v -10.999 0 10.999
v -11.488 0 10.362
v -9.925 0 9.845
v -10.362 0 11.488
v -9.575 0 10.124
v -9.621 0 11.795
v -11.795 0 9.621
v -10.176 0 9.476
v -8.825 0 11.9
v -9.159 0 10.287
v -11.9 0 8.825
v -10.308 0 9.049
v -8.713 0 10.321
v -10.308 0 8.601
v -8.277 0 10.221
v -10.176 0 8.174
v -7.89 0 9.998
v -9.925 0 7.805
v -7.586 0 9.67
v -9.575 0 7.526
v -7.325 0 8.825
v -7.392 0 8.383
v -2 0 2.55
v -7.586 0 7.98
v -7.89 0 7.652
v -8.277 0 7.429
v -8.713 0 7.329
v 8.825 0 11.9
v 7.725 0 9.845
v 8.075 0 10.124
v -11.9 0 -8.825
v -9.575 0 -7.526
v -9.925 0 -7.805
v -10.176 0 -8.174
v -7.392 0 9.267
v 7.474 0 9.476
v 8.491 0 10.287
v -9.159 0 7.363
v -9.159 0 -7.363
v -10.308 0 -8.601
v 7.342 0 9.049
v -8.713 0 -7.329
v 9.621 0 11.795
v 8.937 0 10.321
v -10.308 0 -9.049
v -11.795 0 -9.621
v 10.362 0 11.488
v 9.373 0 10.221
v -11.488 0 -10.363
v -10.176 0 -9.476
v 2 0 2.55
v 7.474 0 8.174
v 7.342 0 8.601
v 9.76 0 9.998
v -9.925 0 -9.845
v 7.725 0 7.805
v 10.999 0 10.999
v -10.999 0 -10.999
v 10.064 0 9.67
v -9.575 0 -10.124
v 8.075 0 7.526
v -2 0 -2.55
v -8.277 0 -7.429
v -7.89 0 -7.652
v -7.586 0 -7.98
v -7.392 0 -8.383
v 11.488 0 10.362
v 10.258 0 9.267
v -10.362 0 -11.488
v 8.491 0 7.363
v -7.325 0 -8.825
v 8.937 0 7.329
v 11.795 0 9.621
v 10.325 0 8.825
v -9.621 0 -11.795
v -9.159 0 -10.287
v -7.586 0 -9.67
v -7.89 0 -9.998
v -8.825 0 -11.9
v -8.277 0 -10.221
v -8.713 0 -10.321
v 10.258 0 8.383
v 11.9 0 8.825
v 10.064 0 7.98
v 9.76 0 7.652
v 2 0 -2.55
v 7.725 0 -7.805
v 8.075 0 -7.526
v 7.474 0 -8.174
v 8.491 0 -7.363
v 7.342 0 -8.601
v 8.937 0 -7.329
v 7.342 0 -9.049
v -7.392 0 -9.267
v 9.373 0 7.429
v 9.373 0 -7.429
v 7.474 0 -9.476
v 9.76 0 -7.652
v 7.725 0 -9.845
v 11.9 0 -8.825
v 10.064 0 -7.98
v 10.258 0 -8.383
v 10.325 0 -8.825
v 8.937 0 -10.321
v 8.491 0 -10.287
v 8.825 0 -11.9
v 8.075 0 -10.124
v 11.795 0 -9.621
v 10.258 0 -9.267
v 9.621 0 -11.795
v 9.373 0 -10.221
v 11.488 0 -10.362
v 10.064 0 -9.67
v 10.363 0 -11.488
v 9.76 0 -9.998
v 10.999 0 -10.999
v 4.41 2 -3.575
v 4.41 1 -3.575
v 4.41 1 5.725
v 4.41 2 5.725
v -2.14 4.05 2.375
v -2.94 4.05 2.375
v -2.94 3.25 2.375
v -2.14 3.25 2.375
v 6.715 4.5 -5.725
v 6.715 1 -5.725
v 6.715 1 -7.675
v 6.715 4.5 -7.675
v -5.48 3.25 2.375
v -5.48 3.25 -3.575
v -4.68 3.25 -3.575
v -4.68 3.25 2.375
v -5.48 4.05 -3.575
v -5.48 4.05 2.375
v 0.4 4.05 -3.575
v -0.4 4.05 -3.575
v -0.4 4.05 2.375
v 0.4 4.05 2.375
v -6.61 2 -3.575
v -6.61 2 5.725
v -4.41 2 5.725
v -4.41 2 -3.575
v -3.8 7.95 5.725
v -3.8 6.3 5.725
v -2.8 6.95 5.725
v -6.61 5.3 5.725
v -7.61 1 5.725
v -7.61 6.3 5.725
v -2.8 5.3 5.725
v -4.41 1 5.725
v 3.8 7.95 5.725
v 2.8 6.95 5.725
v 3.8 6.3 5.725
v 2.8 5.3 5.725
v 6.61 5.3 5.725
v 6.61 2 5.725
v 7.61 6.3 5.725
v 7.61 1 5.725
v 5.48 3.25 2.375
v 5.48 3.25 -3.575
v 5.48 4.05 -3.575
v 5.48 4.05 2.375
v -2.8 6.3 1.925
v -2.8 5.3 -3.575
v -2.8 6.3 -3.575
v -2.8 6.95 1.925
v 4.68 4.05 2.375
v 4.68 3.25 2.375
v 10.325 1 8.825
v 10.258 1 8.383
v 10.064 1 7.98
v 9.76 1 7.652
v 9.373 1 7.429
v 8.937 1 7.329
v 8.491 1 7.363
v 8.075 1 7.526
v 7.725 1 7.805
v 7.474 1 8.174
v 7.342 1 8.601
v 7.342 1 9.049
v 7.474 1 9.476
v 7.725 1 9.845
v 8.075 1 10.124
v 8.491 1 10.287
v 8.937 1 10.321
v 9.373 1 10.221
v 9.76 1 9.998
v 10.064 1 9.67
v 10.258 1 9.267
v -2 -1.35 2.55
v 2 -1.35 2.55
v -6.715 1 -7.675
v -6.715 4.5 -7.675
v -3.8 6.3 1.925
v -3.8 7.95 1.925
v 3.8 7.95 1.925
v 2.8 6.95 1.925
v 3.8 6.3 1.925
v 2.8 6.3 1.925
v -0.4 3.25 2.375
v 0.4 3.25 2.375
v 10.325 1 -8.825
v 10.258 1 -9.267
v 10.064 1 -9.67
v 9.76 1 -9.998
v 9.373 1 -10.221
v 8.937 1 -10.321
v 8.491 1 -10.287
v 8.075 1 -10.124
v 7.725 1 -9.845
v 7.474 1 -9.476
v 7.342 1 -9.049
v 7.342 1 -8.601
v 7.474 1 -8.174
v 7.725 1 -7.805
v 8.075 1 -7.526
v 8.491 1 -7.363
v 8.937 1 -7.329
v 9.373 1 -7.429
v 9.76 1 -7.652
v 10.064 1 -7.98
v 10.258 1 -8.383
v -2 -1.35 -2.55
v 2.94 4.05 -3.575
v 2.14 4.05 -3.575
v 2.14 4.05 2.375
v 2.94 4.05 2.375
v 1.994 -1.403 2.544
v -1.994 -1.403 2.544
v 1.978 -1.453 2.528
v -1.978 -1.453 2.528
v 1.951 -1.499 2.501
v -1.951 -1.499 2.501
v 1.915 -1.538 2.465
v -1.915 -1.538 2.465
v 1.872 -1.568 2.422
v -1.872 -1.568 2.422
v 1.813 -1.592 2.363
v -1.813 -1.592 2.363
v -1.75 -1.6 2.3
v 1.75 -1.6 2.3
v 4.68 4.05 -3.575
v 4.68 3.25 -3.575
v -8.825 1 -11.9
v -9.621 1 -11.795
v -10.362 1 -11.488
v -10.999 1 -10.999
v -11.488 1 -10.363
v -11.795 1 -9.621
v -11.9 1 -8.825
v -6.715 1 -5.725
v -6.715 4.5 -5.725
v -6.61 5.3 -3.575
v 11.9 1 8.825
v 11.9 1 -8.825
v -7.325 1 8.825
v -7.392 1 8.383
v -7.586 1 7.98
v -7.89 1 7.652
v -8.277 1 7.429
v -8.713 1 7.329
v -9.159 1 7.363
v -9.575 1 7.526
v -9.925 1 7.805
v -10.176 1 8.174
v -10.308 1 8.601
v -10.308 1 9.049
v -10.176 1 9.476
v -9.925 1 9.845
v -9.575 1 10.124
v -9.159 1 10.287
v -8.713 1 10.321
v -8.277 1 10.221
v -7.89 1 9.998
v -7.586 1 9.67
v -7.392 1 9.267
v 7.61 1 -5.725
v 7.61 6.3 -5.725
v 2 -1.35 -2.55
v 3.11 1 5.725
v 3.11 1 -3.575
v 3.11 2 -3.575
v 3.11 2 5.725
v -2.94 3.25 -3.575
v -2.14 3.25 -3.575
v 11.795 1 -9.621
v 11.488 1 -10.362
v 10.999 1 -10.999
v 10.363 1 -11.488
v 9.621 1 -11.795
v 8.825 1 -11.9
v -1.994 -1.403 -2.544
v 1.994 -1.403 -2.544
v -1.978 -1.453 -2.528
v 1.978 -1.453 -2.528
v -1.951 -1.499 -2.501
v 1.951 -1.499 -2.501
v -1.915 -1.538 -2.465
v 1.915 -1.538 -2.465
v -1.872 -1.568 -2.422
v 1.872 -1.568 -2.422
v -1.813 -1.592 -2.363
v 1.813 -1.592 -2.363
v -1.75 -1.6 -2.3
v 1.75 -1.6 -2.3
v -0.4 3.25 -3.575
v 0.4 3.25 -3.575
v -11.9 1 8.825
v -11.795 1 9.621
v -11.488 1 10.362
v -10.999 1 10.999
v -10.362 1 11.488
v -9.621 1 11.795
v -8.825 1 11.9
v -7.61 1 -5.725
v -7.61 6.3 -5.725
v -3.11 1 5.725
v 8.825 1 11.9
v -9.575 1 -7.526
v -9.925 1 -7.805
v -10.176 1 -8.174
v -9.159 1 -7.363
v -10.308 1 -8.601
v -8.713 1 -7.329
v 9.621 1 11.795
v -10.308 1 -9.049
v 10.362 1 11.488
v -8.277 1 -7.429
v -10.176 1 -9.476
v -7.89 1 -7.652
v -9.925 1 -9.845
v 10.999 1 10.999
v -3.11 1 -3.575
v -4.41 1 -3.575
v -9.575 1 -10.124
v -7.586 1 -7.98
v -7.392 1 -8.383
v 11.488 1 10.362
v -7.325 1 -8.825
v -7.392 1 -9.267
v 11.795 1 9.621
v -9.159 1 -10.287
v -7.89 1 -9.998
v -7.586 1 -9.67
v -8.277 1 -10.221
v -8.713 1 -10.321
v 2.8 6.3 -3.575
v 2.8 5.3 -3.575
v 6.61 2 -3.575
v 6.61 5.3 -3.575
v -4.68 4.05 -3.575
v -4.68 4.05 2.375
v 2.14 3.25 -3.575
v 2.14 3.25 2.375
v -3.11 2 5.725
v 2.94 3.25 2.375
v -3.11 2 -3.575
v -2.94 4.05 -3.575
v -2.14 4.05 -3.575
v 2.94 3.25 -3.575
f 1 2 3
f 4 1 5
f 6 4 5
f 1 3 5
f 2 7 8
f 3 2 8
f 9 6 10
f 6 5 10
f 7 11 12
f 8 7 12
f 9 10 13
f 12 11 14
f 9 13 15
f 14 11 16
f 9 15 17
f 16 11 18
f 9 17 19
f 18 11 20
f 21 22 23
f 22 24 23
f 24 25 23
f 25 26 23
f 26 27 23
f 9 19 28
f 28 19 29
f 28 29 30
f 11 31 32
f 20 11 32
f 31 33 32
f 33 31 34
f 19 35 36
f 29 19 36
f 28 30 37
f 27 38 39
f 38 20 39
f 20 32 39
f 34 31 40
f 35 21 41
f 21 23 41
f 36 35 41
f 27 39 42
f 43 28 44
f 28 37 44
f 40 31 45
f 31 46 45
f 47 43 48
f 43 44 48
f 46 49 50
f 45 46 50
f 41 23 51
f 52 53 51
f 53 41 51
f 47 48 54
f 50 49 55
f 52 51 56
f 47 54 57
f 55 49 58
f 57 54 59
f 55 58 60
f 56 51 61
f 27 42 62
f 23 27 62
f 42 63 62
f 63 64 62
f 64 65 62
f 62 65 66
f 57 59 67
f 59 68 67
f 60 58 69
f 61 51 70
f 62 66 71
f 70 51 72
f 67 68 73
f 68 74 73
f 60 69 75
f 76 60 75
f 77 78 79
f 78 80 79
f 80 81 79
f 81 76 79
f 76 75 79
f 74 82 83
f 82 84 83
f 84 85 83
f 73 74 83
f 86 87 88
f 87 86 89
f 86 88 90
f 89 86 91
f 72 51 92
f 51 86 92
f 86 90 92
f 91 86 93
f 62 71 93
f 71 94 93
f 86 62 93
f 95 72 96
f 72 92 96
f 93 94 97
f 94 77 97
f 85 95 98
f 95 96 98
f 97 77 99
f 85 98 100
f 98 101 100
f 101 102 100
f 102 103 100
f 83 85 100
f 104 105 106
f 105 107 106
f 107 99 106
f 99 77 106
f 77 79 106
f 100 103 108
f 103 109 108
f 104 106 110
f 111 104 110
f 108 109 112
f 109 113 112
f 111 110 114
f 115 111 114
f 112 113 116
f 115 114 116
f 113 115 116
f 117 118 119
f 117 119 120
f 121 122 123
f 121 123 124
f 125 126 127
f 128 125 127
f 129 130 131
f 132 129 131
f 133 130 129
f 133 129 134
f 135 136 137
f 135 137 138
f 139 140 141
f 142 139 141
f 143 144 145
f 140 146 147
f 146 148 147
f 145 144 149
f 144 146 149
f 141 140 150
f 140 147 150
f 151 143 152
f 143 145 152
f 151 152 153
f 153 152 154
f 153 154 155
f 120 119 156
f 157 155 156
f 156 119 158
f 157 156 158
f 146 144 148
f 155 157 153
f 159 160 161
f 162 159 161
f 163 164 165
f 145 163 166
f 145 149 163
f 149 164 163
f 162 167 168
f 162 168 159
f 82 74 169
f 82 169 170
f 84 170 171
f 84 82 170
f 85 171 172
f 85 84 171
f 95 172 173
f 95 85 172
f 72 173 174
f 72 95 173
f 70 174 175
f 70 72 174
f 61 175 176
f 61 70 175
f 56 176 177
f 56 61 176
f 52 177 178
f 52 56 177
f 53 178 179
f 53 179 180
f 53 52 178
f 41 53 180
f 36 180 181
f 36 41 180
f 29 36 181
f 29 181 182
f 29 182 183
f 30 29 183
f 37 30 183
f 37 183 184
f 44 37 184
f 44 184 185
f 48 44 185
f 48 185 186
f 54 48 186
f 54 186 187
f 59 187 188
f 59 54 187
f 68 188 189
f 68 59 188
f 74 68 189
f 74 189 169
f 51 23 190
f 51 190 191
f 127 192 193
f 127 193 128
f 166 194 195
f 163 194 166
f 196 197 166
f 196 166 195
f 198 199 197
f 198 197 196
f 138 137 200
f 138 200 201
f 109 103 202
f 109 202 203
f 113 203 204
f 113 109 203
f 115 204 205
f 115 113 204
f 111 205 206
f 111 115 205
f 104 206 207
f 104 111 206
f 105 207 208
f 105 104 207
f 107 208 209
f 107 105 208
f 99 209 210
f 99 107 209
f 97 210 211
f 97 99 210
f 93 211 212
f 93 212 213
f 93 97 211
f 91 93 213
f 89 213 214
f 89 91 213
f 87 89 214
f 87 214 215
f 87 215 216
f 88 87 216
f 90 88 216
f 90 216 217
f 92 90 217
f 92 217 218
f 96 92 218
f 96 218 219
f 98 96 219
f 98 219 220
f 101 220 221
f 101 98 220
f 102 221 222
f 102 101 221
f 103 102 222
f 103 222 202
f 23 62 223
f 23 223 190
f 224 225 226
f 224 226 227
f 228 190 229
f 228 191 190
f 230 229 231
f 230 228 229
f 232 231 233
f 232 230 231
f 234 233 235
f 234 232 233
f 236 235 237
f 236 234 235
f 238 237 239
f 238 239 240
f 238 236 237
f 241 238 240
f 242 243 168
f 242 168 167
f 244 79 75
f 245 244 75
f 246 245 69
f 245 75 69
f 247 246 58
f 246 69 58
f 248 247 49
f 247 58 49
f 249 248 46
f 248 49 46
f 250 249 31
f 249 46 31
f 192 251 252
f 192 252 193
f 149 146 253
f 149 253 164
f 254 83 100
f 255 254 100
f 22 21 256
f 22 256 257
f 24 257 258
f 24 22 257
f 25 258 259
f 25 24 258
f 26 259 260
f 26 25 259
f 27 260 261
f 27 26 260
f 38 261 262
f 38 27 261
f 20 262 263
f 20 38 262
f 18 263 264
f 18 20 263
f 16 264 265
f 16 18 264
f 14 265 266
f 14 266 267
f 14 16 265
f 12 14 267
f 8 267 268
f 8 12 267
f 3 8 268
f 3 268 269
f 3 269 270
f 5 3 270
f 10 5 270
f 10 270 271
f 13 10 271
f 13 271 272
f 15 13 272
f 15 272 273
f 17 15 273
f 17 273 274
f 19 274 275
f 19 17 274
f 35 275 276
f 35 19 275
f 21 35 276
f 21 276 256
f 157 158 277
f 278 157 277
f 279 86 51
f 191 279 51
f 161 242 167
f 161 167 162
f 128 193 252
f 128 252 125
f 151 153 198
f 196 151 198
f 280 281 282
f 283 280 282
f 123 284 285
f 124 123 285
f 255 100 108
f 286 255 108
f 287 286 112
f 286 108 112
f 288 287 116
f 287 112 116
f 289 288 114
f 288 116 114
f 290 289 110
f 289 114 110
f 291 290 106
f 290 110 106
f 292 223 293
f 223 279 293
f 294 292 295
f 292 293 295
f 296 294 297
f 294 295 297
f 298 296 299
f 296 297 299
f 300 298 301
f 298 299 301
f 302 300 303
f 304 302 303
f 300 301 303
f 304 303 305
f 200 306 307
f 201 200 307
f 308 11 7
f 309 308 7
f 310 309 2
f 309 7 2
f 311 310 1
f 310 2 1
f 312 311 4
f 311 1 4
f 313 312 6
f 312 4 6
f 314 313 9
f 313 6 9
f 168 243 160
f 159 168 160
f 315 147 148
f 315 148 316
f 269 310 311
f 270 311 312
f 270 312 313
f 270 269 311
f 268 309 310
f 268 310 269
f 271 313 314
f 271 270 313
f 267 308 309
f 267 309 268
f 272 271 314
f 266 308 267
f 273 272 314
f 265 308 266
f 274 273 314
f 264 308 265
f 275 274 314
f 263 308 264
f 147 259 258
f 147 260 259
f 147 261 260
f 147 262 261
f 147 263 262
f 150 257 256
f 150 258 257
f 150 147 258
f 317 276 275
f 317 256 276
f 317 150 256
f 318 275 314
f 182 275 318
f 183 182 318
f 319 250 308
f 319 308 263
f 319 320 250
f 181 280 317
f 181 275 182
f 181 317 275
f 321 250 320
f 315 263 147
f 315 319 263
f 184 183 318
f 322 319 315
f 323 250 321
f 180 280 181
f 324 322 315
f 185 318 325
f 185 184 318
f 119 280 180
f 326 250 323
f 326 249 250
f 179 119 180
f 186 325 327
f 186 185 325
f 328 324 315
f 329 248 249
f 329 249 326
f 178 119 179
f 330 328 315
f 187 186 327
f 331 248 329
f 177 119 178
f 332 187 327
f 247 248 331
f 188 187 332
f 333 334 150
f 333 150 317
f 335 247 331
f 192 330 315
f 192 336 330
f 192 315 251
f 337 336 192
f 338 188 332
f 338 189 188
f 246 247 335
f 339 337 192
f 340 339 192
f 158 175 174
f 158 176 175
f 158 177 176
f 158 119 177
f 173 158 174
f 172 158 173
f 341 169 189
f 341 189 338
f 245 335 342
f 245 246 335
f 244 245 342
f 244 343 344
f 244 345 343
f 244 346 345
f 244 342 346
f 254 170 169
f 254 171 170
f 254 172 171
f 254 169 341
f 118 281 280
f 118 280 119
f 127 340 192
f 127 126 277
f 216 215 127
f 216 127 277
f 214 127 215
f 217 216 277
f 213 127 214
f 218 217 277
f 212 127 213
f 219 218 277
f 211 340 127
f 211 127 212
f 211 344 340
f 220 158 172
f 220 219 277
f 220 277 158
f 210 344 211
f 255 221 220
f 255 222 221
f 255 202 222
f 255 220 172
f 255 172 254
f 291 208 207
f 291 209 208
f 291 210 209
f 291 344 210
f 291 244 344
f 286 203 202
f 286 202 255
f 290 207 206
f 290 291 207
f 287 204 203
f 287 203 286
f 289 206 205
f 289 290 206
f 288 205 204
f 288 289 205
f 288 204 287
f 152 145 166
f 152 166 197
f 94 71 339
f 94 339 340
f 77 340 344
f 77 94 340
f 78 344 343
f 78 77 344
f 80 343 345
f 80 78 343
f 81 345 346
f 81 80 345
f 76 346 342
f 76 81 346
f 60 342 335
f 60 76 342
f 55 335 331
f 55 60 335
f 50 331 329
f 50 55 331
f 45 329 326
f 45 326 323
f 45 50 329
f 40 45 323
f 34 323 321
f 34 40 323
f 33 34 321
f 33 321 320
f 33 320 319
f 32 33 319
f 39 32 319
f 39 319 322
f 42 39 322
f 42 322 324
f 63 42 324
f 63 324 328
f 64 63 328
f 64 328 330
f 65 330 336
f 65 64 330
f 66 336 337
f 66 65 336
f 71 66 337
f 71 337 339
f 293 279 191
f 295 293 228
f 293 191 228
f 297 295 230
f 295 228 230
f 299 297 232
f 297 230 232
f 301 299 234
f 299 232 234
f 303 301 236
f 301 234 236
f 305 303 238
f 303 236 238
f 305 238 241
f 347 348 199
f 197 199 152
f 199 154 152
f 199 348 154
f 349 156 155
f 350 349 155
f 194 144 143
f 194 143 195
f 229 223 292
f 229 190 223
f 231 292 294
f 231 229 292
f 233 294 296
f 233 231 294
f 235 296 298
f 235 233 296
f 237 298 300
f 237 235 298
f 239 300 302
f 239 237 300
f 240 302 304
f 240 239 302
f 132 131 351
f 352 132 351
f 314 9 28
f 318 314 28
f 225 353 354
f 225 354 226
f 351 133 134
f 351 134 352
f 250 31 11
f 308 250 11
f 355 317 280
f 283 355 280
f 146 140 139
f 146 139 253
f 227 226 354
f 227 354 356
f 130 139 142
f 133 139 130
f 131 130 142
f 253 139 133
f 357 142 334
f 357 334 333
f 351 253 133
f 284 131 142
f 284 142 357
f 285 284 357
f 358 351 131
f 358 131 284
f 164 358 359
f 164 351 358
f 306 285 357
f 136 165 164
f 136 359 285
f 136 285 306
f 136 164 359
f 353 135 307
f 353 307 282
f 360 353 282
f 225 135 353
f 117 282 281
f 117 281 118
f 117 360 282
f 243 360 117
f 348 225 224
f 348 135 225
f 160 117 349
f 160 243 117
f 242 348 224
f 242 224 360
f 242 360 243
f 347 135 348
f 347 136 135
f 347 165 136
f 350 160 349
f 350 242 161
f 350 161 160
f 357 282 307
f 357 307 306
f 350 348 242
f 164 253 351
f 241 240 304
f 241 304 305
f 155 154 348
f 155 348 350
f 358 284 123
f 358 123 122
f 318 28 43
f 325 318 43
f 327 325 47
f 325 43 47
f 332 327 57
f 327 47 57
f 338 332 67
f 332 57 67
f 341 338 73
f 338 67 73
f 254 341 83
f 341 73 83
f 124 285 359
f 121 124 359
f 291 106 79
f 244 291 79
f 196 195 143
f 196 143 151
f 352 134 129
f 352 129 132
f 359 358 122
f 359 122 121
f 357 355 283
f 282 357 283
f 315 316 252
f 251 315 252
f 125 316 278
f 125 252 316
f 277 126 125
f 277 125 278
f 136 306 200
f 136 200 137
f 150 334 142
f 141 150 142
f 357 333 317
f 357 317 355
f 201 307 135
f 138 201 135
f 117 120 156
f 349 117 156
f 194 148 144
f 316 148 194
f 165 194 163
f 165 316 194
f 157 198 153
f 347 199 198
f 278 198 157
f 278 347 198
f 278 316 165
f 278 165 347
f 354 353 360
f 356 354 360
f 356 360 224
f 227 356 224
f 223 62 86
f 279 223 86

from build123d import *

# Parameters (mm, degrees)
SKETCH1_R           = 1.5
BOSS_EXTRUDE1_DEPTH = 1
SKETCH2_W           = 15.22
SKETCH2_H           = 11.45
BOSS_EXTRUDE2_DEPTH = 5.3
SKETCH3_W           = 13.43
SKETCH3_H           = 1.95
BOSS_EXTRUDE3_DEPTH = 3.5
SKETCH5_W           = 7.6
SKETCH5_H           = 3.8
BOSS_EXTRUDE4_DEPTH = 1.65
SKETCH4_W           = 13.22
SKETCH4_H           = 3.3
SKETCH4_W_2         = 5.6
SKETCH4_H_2         = 1.65
SKETCH4_W_3         = 1.3
SKETCH4_H_3         = 1
CUT_EXTRUDE1_DEPTH  = 9.3
SKETCH6_W           = 0.8
SKETCH6_H           = 0.8
BOSS_EXTRUDE5_DEPTH = 5.95
SKETCH7_W           = 4
SKETCH7_H           = 5.1
BOSS_EXTRUDE6_DEPTH = 1.6
FILLET1_R           = 0.25


with BuildPart() as part:
    # Sketch1 → Boss-Extrude1 (new body)
    with BuildSketch(Plane(origin=(0, 0, 0), x_dir=(1, 0, 0), z_dir=(0, 1, 0))):
        with BuildLine():
            ThreePointArc((-11.9, -8.825), (-10.999353352, -10.999353352), (-8.825, -11.9))
            Line((-8.825, -11.9), (8.825, -11.9))
            ThreePointArc((8.825, -11.9), (10.999353352, -10.999353352), (11.9, -8.825))
            Line((11.9, -8.825), (11.9, 8.825))
            ThreePointArc((11.9, 8.825), (10.999353357, 10.999353347), (8.825000015, 11.9))
            Line((8.825000015, 11.9), (-8.825, 11.9))
            ThreePointArc((-8.825, 11.9), (-10.999353347, 10.999353357), (-11.9, 8.825000015))
            Line((-11.9, 8.825000015), (-11.9, -8.825))
        make_face()
        with Locations((8.825, -8.825)):
            Circle(SKETCH1_R, mode=Mode.SUBTRACT)
        with Locations((-8.825, -8.825)):
            Circle(SKETCH1_R, mode=Mode.SUBTRACT)
        with Locations((-8.825, 8.825)):
            Circle(SKETCH1_R, mode=Mode.SUBTRACT)
        with Locations((8.825, 8.825)):
            Circle(SKETCH1_R, mode=Mode.SUBTRACT)
    extrude(amount=BOSS_EXTRUDE1_DEPTH)

    # Sketch2 → Boss-Extrude2 (add)
    with BuildSketch(Plane(origin=(0, 1, 0), x_dir=(1, 0, 0), z_dir=(0, 1, 0))):
        Rectangle(SKETCH2_W, SKETCH2_H)
    extrude(amount=BOSS_EXTRUDE2_DEPTH)

    # Sketch3 → Boss-Extrude3 (add)
    with BuildSketch(Plane(origin=(0, 1, 0), x_dir=(1, 0, 0), z_dir=(0, 1, 0))):
        with Locations((0, 6.7)):
            Rectangle(SKETCH3_W, SKETCH3_H)
    extrude(amount=BOSS_EXTRUDE3_DEPTH)

    # Sketch5 → Boss-Extrude4 (add)
    with BuildSketch(Plane(origin=(0, 6.3, 0), x_dir=(1, 0, 0), z_dir=(0, 1, 0))):
        with Locations((0, -3.825)):
            Rectangle(SKETCH5_W, SKETCH5_H)
    extrude(amount=BOSS_EXTRUDE4_DEPTH)

    # Sketch4 → Cut-Extrude1 (cut)
    with BuildSketch(Plane.XY.offset(5.725)):
        with Locations((0, 3.65)):
            Rectangle(SKETCH4_W, SKETCH4_H)
        with Locations((0, 6.125)):
            Rectangle(SKETCH4_W_2, SKETCH4_H_2)
        with Locations((-3.76, 1.5)):
            Rectangle(SKETCH4_W_3, SKETCH4_H_3)
        with Locations((3.76, 1.5)):
            Rectangle(SKETCH4_W_3, SKETCH4_H_3)
    extrude(amount=-CUT_EXTRUDE1_DEPTH, mode=Mode.SUBTRACT)

    # Sketch6 → Boss-Extrude5 (add)
    with BuildSketch(Plane.XY.offset(-3.575)):
        with Locations((2.54, 3.65)):
            Rectangle(SKETCH6_W, SKETCH6_H)
        with Locations((0, 3.65)):
            Rectangle(SKETCH6_W, SKETCH6_H)
        with Locations((5.08, 3.65)):
            Rectangle(SKETCH6_W, SKETCH6_H)
        with Locations((-2.54, 3.65)):
            Rectangle(SKETCH6_W, SKETCH6_H)
        with Locations((-5.08, 3.65)):
            Rectangle(SKETCH6_W, SKETCH6_H)
    extrude(amount=BOSS_EXTRUDE5_DEPTH)

    # Sketch7 → Boss-Extrude6 (add)
    with BuildSketch(Plane.XZ):
        Rectangle(SKETCH7_W, SKETCH7_H)
    extrude(amount=BOSS_EXTRUDE6_DEPTH)

    # Fillet1
    fillet1_edges = [part.edges().sort_by_distance(p)[0] for p in [
        (2, -1.6, 0),
        (0, -1.6, 2.55),
        (-2, -1.6, 0),
        (0, -1.6, -2.55),
    ]]
    fillet(fillet1_edges, radius=FILLET1_R)


solid = part.part
